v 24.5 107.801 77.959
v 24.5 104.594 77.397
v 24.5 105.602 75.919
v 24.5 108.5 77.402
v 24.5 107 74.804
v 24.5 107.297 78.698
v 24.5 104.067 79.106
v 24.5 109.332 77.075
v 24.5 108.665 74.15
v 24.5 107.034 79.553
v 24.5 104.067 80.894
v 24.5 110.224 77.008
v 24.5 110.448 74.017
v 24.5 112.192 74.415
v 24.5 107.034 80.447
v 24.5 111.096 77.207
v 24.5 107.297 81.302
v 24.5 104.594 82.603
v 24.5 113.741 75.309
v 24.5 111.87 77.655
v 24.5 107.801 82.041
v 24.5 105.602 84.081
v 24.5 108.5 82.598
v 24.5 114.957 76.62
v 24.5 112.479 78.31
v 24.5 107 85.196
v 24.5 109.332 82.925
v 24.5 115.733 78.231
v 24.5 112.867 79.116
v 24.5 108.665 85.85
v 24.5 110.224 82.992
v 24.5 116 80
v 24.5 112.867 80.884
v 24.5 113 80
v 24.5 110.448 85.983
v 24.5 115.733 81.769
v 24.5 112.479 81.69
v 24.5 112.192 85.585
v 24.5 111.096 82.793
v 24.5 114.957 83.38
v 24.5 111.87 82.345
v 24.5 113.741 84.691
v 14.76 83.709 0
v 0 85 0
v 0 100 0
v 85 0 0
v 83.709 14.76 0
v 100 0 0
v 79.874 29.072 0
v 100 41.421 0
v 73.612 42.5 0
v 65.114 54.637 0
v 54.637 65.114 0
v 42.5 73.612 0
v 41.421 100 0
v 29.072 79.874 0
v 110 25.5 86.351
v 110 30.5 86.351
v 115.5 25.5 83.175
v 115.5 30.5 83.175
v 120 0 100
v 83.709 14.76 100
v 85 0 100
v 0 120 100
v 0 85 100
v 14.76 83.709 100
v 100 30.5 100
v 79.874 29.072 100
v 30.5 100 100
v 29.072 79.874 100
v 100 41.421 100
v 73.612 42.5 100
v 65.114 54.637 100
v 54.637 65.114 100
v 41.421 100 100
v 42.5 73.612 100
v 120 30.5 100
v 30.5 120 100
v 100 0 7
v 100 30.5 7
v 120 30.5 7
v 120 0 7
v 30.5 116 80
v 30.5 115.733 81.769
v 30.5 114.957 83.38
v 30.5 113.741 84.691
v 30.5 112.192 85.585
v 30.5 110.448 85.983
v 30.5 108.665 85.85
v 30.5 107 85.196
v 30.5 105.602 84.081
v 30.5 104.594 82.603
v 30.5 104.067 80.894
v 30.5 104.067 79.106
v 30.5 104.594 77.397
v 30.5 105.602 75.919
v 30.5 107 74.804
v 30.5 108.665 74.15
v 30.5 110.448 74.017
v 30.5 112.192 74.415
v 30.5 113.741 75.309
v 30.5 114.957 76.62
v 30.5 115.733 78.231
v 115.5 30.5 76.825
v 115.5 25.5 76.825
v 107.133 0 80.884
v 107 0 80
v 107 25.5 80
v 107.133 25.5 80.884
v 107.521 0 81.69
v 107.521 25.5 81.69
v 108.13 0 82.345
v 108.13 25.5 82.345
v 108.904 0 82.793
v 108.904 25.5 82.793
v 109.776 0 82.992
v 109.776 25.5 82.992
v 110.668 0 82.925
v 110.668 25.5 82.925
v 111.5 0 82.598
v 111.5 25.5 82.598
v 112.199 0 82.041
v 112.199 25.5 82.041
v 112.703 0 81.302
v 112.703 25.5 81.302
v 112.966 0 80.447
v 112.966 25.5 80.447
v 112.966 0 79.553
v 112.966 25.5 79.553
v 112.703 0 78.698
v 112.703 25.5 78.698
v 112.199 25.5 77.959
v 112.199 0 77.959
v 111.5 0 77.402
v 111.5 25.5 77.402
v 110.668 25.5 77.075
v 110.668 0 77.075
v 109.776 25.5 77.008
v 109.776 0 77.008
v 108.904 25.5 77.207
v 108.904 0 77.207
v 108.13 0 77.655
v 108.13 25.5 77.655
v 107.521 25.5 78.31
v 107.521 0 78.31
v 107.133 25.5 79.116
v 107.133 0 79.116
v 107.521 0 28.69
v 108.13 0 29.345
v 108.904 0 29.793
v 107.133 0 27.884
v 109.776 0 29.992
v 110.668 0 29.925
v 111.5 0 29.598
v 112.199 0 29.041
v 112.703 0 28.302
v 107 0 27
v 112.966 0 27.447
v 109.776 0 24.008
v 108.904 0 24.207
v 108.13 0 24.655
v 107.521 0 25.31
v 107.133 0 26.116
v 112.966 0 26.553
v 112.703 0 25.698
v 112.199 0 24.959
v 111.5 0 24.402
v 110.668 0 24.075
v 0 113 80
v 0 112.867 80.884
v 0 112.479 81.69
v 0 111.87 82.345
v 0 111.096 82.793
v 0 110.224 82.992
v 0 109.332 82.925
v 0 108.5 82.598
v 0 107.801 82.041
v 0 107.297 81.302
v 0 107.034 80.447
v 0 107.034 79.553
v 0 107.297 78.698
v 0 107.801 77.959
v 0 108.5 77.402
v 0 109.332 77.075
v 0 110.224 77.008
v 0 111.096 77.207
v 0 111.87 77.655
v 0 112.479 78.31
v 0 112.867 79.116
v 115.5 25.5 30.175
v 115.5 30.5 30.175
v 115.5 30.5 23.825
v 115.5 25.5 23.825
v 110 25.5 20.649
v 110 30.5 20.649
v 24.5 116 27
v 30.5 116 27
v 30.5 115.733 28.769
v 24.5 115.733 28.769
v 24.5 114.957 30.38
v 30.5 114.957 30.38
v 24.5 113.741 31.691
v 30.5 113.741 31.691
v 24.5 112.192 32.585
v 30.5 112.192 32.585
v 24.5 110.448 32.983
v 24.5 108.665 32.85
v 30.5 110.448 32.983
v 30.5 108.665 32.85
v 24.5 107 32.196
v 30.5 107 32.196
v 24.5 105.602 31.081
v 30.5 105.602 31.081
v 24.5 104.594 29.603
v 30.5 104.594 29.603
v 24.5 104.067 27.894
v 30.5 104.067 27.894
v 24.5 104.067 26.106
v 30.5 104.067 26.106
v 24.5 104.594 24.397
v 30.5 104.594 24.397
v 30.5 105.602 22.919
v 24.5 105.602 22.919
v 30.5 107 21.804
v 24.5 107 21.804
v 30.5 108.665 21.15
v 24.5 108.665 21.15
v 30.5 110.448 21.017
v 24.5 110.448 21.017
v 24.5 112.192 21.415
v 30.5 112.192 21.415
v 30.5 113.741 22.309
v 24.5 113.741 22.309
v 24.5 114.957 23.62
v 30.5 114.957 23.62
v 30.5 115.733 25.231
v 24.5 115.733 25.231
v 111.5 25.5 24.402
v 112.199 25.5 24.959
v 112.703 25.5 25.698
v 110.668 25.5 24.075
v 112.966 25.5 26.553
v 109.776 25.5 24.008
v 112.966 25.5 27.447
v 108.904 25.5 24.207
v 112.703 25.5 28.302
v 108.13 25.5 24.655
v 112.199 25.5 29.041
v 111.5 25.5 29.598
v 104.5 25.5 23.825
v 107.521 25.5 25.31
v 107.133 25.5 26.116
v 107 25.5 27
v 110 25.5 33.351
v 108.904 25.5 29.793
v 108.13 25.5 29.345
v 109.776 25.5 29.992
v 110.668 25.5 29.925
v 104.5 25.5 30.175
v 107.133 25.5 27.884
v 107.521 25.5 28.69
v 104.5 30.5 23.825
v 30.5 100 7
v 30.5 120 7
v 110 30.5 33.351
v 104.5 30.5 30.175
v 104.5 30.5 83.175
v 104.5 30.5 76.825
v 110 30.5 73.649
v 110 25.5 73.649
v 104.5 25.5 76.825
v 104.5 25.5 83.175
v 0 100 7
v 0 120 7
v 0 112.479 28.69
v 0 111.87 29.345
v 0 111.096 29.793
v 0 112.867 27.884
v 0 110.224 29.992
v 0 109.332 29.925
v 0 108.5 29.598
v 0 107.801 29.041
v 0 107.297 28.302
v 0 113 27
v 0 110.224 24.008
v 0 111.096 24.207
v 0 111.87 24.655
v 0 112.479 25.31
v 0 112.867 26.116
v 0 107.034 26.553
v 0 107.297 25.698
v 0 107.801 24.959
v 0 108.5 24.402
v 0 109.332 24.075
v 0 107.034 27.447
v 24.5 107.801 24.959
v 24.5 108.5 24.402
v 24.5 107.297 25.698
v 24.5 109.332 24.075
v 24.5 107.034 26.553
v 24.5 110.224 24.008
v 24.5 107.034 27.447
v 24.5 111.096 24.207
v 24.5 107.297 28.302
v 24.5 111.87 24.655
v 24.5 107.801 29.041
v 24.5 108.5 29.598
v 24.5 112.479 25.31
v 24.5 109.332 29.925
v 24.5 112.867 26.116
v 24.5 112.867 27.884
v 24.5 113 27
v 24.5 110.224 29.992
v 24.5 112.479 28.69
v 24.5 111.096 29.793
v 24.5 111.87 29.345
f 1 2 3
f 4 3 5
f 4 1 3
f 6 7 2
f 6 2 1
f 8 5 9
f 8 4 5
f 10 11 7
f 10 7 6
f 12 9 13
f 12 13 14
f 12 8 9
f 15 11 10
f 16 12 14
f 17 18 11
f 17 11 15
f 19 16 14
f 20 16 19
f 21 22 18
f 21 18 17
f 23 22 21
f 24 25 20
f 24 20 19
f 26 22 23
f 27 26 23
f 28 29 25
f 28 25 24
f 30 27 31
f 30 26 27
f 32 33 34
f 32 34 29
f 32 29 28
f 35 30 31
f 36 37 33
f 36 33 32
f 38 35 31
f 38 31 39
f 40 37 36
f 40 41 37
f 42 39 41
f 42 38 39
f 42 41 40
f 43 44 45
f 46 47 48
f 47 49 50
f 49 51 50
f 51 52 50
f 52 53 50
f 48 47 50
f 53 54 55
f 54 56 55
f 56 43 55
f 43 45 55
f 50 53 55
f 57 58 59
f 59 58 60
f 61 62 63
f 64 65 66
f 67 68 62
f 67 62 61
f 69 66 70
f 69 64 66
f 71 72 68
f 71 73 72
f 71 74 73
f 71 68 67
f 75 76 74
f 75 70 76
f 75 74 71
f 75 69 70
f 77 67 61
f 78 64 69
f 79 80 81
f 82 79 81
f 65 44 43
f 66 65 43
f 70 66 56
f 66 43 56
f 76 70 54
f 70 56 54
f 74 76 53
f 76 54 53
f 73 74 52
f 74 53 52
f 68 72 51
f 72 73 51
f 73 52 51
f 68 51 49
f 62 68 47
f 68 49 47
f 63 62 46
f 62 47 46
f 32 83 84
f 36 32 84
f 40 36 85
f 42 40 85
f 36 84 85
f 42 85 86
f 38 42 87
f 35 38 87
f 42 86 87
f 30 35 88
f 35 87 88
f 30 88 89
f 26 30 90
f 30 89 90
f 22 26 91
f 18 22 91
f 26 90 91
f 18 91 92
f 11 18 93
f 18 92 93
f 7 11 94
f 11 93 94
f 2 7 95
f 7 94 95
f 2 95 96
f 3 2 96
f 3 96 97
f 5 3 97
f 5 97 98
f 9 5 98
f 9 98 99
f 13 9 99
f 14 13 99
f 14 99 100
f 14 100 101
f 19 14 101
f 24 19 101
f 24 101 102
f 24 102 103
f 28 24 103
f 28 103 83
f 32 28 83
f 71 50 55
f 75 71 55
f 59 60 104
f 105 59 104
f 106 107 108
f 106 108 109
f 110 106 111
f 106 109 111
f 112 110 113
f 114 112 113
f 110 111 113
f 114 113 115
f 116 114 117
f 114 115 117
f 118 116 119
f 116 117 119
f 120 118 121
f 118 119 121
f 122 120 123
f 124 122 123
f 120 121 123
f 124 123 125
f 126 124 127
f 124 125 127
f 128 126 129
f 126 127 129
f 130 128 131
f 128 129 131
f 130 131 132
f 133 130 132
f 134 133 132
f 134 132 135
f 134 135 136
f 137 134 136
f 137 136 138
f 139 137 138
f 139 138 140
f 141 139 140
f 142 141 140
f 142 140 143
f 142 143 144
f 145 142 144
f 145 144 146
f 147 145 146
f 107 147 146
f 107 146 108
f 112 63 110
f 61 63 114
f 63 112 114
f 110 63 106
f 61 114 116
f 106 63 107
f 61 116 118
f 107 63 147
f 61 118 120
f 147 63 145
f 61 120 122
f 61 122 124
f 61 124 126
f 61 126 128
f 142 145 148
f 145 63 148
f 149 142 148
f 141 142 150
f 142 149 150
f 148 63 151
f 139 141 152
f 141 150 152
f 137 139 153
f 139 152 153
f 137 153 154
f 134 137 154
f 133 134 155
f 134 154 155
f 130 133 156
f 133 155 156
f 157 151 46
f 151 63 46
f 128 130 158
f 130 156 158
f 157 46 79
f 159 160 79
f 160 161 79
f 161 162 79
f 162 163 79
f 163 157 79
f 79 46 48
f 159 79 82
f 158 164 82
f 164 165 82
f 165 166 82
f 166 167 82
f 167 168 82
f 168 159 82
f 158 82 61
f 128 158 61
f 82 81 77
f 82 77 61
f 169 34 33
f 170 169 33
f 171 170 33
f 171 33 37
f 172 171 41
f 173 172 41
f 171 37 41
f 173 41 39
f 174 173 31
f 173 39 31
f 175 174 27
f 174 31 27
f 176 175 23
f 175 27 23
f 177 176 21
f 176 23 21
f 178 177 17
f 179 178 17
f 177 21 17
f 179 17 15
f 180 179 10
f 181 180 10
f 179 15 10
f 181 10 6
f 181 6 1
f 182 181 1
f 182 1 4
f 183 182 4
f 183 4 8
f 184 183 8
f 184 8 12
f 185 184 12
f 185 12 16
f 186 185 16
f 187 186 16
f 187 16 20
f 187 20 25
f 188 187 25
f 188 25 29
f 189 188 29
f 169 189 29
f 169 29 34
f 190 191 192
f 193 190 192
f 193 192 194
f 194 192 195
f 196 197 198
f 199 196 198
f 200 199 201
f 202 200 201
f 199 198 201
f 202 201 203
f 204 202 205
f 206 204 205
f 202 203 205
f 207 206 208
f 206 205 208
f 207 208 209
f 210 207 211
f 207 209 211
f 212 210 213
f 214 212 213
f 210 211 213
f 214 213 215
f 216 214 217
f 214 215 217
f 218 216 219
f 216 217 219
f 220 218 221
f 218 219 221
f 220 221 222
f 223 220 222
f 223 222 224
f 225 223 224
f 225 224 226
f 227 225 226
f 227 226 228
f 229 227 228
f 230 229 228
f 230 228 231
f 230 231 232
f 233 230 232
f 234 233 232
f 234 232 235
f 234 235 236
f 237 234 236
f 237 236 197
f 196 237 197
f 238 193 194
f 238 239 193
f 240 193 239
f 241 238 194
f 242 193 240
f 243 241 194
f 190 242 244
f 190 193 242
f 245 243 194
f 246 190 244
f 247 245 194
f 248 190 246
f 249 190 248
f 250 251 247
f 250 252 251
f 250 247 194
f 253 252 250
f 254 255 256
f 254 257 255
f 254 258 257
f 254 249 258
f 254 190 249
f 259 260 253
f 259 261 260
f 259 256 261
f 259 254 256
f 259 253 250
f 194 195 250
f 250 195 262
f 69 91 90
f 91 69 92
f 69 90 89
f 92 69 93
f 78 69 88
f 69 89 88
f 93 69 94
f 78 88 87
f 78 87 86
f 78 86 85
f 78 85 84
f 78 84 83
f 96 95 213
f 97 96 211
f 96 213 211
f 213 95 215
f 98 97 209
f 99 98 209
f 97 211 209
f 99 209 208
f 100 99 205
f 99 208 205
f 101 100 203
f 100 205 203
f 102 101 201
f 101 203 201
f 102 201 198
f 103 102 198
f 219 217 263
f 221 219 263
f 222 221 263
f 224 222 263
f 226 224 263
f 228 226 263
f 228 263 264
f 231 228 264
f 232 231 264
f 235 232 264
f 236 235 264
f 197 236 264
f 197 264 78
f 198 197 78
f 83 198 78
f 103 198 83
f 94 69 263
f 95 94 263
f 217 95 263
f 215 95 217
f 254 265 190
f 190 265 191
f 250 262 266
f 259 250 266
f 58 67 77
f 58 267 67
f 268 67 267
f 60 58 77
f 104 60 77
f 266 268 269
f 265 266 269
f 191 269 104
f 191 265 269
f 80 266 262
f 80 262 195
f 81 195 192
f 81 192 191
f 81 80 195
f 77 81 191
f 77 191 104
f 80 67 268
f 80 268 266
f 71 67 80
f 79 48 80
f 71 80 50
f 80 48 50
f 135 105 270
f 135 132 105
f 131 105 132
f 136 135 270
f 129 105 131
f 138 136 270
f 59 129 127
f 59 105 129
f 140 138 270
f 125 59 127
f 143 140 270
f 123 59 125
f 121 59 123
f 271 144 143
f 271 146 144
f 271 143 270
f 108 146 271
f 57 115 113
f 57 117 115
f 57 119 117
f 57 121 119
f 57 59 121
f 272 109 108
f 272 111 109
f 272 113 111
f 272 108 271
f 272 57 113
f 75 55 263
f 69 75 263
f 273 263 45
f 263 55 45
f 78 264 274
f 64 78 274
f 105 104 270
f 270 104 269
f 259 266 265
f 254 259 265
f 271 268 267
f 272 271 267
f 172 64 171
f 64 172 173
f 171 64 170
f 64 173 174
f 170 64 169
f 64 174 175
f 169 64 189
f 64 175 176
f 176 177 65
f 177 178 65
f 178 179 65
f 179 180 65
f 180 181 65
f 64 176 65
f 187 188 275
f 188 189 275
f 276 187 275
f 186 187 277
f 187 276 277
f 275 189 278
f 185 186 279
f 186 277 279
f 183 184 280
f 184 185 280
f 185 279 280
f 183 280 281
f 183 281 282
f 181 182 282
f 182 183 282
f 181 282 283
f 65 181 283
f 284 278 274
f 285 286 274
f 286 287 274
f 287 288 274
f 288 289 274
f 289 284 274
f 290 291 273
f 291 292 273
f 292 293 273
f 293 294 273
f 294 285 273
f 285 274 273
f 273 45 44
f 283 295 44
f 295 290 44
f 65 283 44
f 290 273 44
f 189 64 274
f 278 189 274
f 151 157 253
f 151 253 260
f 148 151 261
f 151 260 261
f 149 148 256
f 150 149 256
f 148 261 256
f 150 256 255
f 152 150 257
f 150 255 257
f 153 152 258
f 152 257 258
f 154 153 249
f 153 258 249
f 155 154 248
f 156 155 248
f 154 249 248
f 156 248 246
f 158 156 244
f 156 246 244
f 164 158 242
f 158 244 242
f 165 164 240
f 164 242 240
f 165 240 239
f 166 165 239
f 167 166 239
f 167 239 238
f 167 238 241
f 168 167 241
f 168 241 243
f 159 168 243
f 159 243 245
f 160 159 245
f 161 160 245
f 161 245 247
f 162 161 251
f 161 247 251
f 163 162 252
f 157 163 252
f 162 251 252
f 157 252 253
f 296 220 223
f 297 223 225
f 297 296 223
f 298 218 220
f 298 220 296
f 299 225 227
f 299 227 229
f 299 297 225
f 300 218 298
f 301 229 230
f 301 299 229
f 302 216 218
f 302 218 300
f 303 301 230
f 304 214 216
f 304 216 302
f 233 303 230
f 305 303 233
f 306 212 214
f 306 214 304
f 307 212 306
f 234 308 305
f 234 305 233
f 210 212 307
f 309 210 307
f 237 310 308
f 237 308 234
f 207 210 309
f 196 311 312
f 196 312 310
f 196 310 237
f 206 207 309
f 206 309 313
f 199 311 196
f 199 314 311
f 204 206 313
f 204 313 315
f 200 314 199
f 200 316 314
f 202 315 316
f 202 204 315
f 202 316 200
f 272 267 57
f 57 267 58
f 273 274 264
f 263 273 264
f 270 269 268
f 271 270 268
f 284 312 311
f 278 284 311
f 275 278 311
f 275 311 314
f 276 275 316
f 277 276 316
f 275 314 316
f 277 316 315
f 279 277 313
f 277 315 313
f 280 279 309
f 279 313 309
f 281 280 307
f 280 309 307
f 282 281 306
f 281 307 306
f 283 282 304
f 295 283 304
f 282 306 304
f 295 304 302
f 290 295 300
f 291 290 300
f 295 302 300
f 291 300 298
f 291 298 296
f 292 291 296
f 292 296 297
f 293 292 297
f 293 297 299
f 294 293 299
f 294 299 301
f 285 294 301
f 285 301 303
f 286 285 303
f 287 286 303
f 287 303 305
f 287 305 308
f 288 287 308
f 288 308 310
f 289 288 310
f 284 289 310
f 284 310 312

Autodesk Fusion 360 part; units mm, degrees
sketch "Body" plane through (0, 0, 0) normal (0, 0, 1) x (1, 0, 0)
  circle A0 centre (0, 0) radius 85
  line L0 (-100, -41.4214) -> (-41.4214, -100)
  line L1 (-41.4214, -100) -> (41.4214, -100)
  line L2 (41.4214, -100) -> (100, -41.4214)
  line L3 (100, -41.4214) -> (100, 41.4214)
  line L4 (100, 41.4214) -> (41.4214, 100)
  line L5 (41.4214, 100) -> (-41.4214, 100)
  line L6 (-41.4214, 100) -> (-100, 41.4214)
  line L7 (-100, 41.4214) -> (-100, -41.4214)
  line L8 (-30.5, -100) -> (30.5, -100)
  line L9 (30.5, -100) -> (30.5, -120)
  line L10 (30.5, -120) -> (-30.5, -120)
  line L11 (-30.5, -120) -> (-30.5, -100)
  line L12 (-30.5, 100) -> (30.5, 100)
  line L13 (30.5, 100) -> (30.5, 120)
  line L14 (30.5, 120) -> (-30.5, 120)
  line L15 (-30.5, 120) -> (-30.5, 100)
  line L16 (100, 30.5) -> (120, 30.5)
  line L17 (120, 30.5) -> (120, -30.5)
  line L18 (120, -30.5) -> (100, -30.5)
  line L19 (100, -30.5) -> (100, 30.5)
  line L20 (-100, 30.5) -> (-120, 30.5)
  line L21 (-120, 30.5) -> (-120, -30.5)
  line L22 (-120, -30.5) -> (-100, -30.5)
  line L23 (-100, -30.5) -> (-100, 30.5)
  line L24 (-120, 0) -> (120, 0)
  line L25 (0, 120) -> (0, -120)
  dimension "d1" = 170
  dimension "d2" = 100
  dimension "d4" = 61
  dimension "d5" = 20
  dimension "d7" = 61
  dimension "d8" = 20
  dimension "d10" = 61
  dimension "d11" = 20
  dimension "d13" = 20
  dimension "d14" = 61
extrude "Extrude1" add sketch "Body" along normal blind 100 contours A0 L3 L4 L5 L12 L19 L24 L25 | L3 L16 L17 L19 L24 | L5 L12 L13 L14 L25
extrude "Extrude2" cut sketch "Body" along normal blind 7 contours L3 L16 L17 L19 L24 | L5 L12 L13 L14 L25
sketch "H_Circle" plane through (30.5, 0, 0) normal (1, 0, 0) x (0, 1, 0)
  line L0 (100, 7) -> (120, 7)
  line L1 (120, 7) -> (120, 100)
  line L2 (120, 100) -> (100, 100)
  line L3 (100, 100) -> (100, 7)
  line L4 (100, 100) -> (120, 100)
  line L5 (120, 100) -> (120, 7)
  line L6 (120, 7) -> (100, 7)
  line L7 (100, 7) -> (100, 100)
  line L8 (100, 100) -> (120, 100)
  line L9 (120, 100) -> (120, 80)
  line L10 (100, 80) -> (100, 100)
  line L11 (100, 7) -> (120, 7)
  line L12 (120, 7) -> (120, 27)
  line L13 (100, 27) -> (100, 7)
  circle A0 centre (110, 80) radius 6
  circle A1 centre (110, 80) radius 3
  circle A2 centre (110, 27) radius 6
  circle A3 centre (110, 27) radius 3
  dimension "d19" = 20
  dimension "d20" = 20
  dimension "d21" = 12
  dimension "d22" = 6
  dimension "d23" = 12
  dimension "d24" = 6
extrude "Extrude3" cut sketch "H_Circle" against normal blind 70 contours A1 | A3
extrude "Extrude4" cut sketch "H_Circle" against normal blind 6 contours A0 | A2
sketch "H_Hex" plane through (0, 30.5, 0) normal (0, 1, 0) x (-1, 0, 0)
  line L0 (-120, 7) -> (-100, 7)
  line L1 (-100, 7) -> (-100, 100)
  line L2 (-100, 100) -> (-120, 100)
  line L3 (-120, 100) -> (-120, 7)
  line L4 (-120, 100) -> (-100, 100)
  line L5 (-100, 100) -> (-100, 7)
  line L6 (-100, 7) -> (-120, 7)
  line L7 (-120, 7) -> (-120, 100)
  line L8 (-120, 100) -> (-100, 100)
  line L9 (-100, 100) -> (-100, 80)
  line L10 (-120, 80) -> (-120, 100)
  line L11 (-120, 7) -> (-100, 7)
  line L12 (-100, 7) -> (-100, 27)
  line L13 (-120, 27) -> (-120, 7)
  circle A0 centre (-110, 80) radius 3
  circle A1 centre (-110, 27) radius 3
  line L14 (-115.5, 76.8246) -> (-110, 73.6491)
  line L15 (-110, 73.6491) -> (-104.5, 76.8246)
  line L16 (-104.5, 76.8246) -> (-104.5, 83.1754)
  line L17 (-104.5, 83.1754) -> (-110, 86.3509)
  line L18 (-110, 86.3509) -> (-115.5, 83.1754)
  line L19 (-115.5, 83.1754) -> (-115.5, 76.8246)
  line L20 (-115.5, 23.8246) -> (-110, 20.6491)
  line L21 (-110, 20.6491) -> (-104.5, 23.8246)
  line L22 (-104.5, 23.8246) -> (-104.5, 30.1754)
  line L23 (-104.5, 30.1754) -> (-110, 33.3509)
  line L24 (-110, 33.3509) -> (-115.5, 30.1754)
  line L25 (-115.5, 30.1754) -> (-115.5, 23.8246)
  point P0 (-110, 80)
  point P1 (-110, 27)
  dimension "d30" = 20
  dimension "d31" = 20
  dimension "d32" = 6
  dimension "d33" = 6
  dimension "d34" = 5.5
  dimension "d35" = 5.5
extrude "Extrude5" cut sketch "H_Hex" against normal blind 5 contours L14 L15 L16 L17 L18 L19 | L20 L21 L22 L23 L24 L25
extrude "Extrude6" cut 2 faces at (110.2225, 30.5, 80.9749) (109.2094, 30.5, 26.0676) along direction (0, -1, 0) blind 80
